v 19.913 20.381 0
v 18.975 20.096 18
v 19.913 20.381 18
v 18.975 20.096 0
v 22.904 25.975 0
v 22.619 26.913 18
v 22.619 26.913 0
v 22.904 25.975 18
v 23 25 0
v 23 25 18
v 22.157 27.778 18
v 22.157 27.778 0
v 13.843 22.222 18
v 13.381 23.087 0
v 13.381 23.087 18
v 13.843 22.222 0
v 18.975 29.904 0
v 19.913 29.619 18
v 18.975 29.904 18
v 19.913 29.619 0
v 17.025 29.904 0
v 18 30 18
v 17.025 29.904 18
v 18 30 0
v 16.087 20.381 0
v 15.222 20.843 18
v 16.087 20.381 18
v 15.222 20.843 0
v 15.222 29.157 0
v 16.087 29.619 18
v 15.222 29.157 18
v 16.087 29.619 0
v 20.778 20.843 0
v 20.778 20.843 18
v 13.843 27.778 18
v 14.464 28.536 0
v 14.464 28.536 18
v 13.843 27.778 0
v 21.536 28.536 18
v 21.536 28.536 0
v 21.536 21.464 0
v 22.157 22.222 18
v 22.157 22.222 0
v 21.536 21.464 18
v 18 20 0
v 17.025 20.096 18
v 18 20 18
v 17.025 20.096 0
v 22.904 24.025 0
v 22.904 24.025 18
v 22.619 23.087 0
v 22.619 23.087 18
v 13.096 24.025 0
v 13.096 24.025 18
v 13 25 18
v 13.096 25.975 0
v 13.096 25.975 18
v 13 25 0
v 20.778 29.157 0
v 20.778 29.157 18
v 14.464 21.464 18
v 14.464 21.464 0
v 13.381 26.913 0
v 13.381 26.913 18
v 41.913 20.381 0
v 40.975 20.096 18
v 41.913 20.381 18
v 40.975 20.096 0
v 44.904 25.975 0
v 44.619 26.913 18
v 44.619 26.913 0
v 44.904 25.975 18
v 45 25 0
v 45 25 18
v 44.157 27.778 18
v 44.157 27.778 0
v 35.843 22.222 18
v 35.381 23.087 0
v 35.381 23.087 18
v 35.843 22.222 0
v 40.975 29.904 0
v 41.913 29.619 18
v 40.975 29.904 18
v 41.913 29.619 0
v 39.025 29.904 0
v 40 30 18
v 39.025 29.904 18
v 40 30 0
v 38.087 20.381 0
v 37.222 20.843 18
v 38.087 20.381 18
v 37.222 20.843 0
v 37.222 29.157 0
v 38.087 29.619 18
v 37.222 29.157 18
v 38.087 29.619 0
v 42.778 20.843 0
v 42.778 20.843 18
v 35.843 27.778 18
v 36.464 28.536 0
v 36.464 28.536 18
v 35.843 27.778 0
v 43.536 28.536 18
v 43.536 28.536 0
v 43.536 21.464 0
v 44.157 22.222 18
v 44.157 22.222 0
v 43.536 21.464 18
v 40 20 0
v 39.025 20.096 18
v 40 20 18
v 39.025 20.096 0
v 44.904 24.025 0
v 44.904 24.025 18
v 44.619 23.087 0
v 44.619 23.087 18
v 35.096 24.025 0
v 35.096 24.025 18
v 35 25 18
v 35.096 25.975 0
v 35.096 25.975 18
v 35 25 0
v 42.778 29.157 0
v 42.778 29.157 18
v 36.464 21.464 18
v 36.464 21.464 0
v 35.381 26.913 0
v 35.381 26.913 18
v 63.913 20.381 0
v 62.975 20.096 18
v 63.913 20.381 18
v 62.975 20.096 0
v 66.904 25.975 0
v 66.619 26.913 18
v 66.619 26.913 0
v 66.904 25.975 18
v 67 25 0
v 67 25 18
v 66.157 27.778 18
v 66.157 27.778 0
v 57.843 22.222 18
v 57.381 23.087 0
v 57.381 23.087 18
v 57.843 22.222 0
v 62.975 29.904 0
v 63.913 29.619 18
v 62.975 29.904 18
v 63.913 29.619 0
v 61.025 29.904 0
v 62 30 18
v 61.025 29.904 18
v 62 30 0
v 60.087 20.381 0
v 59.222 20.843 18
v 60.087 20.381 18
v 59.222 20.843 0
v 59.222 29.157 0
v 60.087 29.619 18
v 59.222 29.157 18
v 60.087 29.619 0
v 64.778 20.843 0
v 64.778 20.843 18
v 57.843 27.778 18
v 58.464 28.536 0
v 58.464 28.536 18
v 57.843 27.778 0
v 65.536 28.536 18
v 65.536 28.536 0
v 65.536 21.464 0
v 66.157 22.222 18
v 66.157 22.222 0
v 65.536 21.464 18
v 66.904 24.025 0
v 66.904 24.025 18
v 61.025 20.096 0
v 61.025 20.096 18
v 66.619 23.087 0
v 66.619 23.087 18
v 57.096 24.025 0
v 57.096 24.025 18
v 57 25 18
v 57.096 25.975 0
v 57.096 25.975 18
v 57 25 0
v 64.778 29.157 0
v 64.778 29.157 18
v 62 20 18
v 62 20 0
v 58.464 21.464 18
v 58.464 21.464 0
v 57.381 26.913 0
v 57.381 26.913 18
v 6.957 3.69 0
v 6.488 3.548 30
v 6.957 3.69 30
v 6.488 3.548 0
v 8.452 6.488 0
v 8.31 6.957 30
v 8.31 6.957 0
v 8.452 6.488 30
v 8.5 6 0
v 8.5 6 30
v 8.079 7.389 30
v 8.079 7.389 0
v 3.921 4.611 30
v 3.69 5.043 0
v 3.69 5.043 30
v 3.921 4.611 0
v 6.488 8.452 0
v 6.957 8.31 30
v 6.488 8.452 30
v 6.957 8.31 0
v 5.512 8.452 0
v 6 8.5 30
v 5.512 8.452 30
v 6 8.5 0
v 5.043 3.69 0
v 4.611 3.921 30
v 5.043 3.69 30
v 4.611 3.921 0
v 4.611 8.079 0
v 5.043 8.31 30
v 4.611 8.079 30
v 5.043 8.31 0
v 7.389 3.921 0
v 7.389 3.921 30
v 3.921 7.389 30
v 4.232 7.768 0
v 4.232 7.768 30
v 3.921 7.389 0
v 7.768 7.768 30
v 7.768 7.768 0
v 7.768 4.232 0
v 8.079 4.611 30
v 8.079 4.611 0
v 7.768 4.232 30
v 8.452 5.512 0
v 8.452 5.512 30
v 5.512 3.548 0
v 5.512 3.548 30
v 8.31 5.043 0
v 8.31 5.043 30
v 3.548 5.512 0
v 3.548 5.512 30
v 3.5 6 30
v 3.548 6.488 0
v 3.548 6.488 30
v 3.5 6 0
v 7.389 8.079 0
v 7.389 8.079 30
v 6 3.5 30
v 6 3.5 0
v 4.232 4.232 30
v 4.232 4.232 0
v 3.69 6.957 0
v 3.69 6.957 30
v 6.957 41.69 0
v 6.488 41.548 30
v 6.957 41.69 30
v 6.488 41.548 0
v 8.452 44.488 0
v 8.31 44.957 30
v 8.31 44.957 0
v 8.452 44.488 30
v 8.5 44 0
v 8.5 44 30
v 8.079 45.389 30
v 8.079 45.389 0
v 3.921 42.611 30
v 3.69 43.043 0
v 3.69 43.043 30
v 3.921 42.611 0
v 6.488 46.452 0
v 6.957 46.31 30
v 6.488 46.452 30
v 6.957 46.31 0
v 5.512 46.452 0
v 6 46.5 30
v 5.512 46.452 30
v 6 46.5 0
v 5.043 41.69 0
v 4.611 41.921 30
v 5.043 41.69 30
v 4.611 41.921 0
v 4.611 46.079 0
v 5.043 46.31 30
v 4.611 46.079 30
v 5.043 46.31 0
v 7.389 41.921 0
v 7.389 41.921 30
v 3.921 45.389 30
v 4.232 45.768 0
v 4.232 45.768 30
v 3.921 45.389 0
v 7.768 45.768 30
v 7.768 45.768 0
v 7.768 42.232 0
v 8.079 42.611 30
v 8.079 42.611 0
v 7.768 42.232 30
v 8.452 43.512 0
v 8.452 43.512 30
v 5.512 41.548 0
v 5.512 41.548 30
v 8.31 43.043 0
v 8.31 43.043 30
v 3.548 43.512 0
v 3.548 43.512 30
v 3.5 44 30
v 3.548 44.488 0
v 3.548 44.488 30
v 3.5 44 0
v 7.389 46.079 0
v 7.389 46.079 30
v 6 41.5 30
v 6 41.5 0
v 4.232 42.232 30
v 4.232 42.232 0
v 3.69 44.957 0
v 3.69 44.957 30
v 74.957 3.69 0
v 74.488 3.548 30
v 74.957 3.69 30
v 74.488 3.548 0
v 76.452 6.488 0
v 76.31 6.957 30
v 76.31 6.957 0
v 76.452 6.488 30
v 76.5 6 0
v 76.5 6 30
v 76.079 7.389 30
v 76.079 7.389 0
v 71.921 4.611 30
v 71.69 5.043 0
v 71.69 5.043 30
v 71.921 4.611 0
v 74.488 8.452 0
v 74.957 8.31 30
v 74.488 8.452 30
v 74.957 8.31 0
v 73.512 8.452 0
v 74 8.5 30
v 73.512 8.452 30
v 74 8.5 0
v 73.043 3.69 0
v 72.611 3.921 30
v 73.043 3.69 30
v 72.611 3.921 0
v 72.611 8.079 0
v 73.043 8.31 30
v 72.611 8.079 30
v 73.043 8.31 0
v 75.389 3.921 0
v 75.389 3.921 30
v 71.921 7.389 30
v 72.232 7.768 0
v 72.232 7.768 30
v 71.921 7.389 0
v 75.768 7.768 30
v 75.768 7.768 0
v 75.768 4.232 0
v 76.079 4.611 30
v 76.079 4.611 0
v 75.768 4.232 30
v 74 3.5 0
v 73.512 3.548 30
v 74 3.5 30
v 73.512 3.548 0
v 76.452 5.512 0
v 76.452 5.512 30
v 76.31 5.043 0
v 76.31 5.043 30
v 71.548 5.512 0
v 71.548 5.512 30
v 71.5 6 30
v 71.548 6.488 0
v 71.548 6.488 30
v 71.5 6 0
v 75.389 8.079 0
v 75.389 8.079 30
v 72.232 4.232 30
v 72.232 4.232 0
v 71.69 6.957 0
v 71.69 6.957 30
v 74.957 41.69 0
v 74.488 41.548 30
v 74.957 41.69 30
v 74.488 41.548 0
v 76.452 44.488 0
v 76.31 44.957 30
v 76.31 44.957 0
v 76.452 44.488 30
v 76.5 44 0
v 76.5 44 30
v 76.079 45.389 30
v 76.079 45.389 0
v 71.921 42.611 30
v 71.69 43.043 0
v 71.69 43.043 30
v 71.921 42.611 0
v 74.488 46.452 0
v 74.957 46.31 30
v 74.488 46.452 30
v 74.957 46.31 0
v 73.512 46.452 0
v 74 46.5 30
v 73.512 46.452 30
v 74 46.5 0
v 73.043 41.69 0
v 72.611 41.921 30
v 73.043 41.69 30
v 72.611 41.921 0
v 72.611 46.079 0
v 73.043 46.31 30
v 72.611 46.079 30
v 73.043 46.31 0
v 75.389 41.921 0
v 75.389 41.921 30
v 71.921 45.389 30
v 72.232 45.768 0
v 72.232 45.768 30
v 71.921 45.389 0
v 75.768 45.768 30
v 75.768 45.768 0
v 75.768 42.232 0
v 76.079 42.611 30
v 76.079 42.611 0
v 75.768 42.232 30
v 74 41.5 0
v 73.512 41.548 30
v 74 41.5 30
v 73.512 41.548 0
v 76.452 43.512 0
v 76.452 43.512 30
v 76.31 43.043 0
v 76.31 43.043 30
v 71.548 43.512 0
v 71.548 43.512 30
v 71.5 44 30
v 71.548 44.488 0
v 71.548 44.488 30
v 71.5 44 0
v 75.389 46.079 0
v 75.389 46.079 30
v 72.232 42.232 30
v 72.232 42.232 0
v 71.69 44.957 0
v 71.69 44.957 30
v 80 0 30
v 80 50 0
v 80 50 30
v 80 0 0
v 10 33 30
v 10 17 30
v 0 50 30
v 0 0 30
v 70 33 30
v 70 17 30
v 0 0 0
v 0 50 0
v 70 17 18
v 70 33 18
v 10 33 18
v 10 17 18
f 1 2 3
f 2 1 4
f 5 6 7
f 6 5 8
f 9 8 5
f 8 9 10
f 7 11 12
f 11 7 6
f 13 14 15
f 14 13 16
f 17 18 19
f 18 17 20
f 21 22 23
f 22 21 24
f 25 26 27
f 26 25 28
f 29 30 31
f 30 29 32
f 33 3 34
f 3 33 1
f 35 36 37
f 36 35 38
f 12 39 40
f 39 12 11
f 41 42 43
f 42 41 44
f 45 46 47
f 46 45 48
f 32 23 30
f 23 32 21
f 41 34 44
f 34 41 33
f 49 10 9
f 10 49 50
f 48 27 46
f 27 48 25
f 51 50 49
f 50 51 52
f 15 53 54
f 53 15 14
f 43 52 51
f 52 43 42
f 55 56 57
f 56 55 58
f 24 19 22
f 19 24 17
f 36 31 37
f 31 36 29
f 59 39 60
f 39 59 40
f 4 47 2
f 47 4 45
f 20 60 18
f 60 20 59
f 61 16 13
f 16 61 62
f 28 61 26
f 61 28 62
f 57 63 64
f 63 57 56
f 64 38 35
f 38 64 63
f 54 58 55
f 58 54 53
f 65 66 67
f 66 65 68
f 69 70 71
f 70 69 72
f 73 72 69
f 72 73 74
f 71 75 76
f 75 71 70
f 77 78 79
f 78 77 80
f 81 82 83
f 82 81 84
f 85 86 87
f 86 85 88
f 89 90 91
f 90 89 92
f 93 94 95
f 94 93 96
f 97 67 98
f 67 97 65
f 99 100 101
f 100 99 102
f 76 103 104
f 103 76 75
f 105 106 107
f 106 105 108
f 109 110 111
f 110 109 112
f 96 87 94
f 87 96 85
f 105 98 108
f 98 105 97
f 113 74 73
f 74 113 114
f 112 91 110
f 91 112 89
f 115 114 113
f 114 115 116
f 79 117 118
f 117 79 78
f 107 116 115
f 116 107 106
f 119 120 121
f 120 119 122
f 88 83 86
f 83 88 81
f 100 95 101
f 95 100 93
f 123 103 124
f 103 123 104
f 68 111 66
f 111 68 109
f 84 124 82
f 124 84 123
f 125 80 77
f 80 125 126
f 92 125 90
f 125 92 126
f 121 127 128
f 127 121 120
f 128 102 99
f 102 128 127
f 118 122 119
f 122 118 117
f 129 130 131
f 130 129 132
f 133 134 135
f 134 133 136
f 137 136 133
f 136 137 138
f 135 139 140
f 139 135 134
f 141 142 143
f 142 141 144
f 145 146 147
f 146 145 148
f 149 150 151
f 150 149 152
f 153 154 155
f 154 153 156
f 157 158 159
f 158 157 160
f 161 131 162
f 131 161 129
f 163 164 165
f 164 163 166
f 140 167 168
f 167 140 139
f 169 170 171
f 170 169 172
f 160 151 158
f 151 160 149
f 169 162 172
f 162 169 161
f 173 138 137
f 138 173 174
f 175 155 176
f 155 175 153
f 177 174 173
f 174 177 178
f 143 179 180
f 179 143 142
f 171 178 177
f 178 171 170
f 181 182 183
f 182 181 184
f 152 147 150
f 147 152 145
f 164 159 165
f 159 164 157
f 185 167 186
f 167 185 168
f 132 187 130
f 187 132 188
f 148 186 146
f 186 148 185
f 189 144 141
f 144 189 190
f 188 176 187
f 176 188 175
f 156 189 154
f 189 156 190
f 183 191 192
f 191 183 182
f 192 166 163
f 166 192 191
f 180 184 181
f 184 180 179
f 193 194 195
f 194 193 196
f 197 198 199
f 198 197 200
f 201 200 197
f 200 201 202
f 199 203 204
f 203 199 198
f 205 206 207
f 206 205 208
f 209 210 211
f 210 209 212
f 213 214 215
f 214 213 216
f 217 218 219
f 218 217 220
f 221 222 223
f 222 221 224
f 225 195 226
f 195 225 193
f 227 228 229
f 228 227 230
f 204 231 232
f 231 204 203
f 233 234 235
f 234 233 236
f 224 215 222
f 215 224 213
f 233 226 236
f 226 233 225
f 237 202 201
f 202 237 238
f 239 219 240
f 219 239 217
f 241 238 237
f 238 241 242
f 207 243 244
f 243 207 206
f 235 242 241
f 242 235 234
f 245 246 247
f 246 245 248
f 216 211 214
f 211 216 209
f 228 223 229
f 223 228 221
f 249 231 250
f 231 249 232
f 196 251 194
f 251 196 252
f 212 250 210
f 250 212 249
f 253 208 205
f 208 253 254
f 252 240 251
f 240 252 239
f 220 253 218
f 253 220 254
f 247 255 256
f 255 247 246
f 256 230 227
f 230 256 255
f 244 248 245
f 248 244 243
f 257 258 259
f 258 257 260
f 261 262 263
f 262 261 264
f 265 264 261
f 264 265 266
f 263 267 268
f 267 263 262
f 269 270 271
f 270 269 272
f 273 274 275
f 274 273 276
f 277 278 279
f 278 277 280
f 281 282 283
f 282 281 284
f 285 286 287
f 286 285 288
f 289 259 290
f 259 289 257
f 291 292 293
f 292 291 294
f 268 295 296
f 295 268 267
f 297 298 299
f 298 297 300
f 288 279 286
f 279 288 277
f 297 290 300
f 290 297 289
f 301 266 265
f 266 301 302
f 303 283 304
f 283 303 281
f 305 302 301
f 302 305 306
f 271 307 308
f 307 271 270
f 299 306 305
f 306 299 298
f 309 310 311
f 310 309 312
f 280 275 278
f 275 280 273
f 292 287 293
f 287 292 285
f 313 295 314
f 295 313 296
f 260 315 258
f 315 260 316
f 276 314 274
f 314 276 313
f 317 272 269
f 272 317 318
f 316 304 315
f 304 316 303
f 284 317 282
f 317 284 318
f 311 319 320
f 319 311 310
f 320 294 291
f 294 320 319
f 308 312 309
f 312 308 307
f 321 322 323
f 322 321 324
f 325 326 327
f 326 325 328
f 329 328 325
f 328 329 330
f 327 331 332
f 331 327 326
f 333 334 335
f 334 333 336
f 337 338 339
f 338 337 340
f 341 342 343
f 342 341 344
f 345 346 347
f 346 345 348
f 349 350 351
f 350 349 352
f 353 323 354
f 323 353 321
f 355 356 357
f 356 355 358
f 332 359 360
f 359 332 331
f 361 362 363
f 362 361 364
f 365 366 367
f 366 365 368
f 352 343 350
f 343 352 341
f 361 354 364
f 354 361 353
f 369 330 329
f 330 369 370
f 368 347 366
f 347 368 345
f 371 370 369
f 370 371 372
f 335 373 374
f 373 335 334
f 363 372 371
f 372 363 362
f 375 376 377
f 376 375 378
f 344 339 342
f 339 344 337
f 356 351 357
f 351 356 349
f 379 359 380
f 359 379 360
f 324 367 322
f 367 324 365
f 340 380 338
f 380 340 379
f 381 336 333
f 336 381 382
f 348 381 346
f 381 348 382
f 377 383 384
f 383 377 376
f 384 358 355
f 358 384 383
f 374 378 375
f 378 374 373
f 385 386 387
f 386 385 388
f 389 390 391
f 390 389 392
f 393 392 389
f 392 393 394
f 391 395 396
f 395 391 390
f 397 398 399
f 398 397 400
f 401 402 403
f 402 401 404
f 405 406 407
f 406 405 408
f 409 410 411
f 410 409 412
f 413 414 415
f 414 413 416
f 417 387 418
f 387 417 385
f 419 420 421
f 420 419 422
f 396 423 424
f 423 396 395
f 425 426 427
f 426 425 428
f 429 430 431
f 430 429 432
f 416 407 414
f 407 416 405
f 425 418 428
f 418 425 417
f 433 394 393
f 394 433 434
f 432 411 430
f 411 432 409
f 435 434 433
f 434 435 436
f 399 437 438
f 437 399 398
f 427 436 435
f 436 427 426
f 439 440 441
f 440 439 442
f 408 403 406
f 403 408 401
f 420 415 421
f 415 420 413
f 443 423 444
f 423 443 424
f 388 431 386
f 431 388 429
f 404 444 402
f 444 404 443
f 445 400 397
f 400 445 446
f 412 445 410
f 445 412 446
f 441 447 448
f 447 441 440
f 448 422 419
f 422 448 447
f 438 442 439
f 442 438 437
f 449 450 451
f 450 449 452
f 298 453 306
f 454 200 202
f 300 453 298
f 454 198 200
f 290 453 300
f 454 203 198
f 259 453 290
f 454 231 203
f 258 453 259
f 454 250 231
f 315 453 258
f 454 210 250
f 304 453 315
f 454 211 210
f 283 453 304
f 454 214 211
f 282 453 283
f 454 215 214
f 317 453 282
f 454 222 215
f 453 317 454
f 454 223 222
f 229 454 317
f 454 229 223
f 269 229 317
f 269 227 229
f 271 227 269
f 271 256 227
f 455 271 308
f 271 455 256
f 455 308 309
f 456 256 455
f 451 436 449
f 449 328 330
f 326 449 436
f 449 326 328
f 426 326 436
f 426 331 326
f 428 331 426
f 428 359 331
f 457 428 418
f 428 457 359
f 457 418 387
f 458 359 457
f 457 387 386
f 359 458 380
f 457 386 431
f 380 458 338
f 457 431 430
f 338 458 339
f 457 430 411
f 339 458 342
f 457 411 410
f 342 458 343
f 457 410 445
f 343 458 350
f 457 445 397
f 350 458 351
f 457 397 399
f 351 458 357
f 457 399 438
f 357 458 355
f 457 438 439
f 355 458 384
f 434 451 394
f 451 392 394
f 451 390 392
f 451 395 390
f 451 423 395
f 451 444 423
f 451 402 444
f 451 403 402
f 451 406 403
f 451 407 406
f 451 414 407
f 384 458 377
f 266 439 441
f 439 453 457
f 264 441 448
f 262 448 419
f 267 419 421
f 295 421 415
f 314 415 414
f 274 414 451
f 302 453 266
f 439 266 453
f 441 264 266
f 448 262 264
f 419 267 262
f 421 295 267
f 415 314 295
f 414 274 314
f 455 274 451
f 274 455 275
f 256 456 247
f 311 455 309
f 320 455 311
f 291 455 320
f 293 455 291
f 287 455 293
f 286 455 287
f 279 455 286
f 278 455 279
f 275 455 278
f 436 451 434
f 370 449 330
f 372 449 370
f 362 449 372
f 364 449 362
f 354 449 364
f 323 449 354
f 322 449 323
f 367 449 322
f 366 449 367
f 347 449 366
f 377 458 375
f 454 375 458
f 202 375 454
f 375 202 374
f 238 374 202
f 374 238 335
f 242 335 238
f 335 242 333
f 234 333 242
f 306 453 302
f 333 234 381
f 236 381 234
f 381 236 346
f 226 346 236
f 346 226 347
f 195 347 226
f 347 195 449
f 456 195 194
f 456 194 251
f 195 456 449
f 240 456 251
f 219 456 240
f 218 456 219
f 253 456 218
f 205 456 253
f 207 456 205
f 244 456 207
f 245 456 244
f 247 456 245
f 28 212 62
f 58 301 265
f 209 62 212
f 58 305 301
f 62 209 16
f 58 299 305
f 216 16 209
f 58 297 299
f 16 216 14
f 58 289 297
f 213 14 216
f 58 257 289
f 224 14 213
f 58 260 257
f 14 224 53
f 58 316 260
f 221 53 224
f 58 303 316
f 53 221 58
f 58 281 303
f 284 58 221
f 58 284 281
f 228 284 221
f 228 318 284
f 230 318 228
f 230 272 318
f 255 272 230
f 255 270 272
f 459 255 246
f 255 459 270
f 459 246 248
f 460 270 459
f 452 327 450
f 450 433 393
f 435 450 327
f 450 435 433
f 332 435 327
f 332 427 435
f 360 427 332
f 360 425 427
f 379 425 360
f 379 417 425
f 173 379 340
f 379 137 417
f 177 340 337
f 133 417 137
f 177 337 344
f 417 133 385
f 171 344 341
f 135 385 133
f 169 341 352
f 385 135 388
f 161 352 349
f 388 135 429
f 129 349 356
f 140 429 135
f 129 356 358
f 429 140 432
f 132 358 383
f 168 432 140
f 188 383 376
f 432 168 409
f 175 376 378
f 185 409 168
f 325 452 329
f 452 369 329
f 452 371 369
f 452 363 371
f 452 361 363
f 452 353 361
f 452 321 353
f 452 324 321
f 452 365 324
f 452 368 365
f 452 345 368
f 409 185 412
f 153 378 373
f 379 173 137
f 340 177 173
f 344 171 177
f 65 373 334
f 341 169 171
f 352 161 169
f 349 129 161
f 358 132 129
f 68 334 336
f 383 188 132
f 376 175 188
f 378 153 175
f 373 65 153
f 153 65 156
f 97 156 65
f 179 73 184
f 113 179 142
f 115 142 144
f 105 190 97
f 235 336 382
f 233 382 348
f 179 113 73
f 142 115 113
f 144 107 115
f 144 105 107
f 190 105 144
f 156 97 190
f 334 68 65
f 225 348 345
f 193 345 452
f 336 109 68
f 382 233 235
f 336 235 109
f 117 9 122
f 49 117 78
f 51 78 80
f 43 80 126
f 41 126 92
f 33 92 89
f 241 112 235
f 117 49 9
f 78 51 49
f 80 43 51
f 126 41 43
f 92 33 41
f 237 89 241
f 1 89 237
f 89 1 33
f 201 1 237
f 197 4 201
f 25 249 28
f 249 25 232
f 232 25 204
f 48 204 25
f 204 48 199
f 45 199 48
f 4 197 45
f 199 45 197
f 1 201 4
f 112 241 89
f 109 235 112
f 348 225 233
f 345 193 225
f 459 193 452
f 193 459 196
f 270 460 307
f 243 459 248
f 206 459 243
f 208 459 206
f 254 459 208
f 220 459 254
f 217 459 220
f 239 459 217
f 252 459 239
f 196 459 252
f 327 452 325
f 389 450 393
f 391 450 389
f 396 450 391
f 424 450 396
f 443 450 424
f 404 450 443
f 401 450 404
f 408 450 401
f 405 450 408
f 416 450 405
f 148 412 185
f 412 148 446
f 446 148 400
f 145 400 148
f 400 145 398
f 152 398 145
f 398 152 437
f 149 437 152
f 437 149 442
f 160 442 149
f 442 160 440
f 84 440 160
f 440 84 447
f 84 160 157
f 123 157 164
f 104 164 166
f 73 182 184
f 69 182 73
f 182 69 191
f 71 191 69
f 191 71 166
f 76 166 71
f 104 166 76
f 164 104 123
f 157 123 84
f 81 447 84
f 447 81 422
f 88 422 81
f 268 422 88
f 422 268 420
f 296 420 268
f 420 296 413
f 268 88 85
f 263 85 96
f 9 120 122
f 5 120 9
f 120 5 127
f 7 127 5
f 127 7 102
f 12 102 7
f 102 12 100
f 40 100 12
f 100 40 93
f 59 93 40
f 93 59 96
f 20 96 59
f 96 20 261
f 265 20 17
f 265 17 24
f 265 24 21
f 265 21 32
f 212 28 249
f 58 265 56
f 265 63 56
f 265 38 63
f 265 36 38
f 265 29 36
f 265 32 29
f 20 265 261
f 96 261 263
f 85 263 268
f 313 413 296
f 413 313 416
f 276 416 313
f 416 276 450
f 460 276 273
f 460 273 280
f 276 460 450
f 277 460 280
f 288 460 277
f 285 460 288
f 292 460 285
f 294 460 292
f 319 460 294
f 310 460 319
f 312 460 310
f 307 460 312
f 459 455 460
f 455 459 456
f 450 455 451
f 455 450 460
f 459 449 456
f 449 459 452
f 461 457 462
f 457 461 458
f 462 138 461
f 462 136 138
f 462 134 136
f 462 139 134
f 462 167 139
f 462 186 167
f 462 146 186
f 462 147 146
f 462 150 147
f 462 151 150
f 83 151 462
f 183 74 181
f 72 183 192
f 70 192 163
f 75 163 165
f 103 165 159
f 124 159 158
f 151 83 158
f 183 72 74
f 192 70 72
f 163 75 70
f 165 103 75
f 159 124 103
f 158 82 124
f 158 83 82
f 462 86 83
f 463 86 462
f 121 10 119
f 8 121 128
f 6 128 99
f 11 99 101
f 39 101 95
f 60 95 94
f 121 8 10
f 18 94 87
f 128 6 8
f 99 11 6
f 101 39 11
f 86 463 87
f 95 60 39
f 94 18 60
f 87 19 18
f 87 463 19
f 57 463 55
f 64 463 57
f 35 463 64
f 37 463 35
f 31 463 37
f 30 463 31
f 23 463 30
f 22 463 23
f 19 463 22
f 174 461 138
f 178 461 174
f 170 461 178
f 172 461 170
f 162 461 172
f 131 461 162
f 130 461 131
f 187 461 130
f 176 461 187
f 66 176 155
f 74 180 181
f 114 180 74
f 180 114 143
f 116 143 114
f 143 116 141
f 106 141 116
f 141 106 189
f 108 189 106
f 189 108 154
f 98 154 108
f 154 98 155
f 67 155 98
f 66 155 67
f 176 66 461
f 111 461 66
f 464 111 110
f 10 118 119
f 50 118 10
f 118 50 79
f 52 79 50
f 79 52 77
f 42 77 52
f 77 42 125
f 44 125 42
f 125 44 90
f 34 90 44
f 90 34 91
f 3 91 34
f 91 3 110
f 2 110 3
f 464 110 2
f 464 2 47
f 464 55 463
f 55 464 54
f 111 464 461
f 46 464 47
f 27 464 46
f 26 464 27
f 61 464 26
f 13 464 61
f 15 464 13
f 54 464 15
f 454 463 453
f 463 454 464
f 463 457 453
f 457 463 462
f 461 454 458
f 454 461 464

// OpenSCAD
$fn = 32;

// ----------------------------------------------------------------------
// Manifold block: gallery_top manifold
// ----------------------------------------------------------------------

// --- parameters (mm) ---
block_l = 80;             // block length, X
block_w = 50;             // block width, Y
block_h = 30;             // block height, Z
port_d = 10;              // port bore diameter
port_pitch = 22;          // port pitch along X
gallery_d = 16;           // top gallery width, Y
gallery_depth = 12;       // gallery pocket depth
wall_p = 10;              // gallery end wall thickness, X
mnt_d = 5;                // mounting hole diameter
mnt_in = 6;               // mounting hole inset from the edges

n_ports = 3;  // ports in the row
port_x0 = (block_l - (n_ports - 1) * port_pitch) / 2;  // first port X

difference() {
  cube([block_l, block_w, block_h]);
  for (i = [0 : n_ports - 1])
    translate([port_x0 + i * port_pitch, block_w / 2, -1])
      cylinder(h = block_h + 2, d = port_d);
  translate([wall_p, block_w / 2 - gallery_d / 2, block_h - gallery_depth])
    cube([block_l - 2 * wall_p, gallery_d, gallery_depth + 1]);
  for (cx = [mnt_in, block_l - mnt_in])
    for (cy = [mnt_in, block_w - mnt_in])
      translate([cx, cy, -1]) cylinder(h = block_h + 2, d = mnt_d);
}
